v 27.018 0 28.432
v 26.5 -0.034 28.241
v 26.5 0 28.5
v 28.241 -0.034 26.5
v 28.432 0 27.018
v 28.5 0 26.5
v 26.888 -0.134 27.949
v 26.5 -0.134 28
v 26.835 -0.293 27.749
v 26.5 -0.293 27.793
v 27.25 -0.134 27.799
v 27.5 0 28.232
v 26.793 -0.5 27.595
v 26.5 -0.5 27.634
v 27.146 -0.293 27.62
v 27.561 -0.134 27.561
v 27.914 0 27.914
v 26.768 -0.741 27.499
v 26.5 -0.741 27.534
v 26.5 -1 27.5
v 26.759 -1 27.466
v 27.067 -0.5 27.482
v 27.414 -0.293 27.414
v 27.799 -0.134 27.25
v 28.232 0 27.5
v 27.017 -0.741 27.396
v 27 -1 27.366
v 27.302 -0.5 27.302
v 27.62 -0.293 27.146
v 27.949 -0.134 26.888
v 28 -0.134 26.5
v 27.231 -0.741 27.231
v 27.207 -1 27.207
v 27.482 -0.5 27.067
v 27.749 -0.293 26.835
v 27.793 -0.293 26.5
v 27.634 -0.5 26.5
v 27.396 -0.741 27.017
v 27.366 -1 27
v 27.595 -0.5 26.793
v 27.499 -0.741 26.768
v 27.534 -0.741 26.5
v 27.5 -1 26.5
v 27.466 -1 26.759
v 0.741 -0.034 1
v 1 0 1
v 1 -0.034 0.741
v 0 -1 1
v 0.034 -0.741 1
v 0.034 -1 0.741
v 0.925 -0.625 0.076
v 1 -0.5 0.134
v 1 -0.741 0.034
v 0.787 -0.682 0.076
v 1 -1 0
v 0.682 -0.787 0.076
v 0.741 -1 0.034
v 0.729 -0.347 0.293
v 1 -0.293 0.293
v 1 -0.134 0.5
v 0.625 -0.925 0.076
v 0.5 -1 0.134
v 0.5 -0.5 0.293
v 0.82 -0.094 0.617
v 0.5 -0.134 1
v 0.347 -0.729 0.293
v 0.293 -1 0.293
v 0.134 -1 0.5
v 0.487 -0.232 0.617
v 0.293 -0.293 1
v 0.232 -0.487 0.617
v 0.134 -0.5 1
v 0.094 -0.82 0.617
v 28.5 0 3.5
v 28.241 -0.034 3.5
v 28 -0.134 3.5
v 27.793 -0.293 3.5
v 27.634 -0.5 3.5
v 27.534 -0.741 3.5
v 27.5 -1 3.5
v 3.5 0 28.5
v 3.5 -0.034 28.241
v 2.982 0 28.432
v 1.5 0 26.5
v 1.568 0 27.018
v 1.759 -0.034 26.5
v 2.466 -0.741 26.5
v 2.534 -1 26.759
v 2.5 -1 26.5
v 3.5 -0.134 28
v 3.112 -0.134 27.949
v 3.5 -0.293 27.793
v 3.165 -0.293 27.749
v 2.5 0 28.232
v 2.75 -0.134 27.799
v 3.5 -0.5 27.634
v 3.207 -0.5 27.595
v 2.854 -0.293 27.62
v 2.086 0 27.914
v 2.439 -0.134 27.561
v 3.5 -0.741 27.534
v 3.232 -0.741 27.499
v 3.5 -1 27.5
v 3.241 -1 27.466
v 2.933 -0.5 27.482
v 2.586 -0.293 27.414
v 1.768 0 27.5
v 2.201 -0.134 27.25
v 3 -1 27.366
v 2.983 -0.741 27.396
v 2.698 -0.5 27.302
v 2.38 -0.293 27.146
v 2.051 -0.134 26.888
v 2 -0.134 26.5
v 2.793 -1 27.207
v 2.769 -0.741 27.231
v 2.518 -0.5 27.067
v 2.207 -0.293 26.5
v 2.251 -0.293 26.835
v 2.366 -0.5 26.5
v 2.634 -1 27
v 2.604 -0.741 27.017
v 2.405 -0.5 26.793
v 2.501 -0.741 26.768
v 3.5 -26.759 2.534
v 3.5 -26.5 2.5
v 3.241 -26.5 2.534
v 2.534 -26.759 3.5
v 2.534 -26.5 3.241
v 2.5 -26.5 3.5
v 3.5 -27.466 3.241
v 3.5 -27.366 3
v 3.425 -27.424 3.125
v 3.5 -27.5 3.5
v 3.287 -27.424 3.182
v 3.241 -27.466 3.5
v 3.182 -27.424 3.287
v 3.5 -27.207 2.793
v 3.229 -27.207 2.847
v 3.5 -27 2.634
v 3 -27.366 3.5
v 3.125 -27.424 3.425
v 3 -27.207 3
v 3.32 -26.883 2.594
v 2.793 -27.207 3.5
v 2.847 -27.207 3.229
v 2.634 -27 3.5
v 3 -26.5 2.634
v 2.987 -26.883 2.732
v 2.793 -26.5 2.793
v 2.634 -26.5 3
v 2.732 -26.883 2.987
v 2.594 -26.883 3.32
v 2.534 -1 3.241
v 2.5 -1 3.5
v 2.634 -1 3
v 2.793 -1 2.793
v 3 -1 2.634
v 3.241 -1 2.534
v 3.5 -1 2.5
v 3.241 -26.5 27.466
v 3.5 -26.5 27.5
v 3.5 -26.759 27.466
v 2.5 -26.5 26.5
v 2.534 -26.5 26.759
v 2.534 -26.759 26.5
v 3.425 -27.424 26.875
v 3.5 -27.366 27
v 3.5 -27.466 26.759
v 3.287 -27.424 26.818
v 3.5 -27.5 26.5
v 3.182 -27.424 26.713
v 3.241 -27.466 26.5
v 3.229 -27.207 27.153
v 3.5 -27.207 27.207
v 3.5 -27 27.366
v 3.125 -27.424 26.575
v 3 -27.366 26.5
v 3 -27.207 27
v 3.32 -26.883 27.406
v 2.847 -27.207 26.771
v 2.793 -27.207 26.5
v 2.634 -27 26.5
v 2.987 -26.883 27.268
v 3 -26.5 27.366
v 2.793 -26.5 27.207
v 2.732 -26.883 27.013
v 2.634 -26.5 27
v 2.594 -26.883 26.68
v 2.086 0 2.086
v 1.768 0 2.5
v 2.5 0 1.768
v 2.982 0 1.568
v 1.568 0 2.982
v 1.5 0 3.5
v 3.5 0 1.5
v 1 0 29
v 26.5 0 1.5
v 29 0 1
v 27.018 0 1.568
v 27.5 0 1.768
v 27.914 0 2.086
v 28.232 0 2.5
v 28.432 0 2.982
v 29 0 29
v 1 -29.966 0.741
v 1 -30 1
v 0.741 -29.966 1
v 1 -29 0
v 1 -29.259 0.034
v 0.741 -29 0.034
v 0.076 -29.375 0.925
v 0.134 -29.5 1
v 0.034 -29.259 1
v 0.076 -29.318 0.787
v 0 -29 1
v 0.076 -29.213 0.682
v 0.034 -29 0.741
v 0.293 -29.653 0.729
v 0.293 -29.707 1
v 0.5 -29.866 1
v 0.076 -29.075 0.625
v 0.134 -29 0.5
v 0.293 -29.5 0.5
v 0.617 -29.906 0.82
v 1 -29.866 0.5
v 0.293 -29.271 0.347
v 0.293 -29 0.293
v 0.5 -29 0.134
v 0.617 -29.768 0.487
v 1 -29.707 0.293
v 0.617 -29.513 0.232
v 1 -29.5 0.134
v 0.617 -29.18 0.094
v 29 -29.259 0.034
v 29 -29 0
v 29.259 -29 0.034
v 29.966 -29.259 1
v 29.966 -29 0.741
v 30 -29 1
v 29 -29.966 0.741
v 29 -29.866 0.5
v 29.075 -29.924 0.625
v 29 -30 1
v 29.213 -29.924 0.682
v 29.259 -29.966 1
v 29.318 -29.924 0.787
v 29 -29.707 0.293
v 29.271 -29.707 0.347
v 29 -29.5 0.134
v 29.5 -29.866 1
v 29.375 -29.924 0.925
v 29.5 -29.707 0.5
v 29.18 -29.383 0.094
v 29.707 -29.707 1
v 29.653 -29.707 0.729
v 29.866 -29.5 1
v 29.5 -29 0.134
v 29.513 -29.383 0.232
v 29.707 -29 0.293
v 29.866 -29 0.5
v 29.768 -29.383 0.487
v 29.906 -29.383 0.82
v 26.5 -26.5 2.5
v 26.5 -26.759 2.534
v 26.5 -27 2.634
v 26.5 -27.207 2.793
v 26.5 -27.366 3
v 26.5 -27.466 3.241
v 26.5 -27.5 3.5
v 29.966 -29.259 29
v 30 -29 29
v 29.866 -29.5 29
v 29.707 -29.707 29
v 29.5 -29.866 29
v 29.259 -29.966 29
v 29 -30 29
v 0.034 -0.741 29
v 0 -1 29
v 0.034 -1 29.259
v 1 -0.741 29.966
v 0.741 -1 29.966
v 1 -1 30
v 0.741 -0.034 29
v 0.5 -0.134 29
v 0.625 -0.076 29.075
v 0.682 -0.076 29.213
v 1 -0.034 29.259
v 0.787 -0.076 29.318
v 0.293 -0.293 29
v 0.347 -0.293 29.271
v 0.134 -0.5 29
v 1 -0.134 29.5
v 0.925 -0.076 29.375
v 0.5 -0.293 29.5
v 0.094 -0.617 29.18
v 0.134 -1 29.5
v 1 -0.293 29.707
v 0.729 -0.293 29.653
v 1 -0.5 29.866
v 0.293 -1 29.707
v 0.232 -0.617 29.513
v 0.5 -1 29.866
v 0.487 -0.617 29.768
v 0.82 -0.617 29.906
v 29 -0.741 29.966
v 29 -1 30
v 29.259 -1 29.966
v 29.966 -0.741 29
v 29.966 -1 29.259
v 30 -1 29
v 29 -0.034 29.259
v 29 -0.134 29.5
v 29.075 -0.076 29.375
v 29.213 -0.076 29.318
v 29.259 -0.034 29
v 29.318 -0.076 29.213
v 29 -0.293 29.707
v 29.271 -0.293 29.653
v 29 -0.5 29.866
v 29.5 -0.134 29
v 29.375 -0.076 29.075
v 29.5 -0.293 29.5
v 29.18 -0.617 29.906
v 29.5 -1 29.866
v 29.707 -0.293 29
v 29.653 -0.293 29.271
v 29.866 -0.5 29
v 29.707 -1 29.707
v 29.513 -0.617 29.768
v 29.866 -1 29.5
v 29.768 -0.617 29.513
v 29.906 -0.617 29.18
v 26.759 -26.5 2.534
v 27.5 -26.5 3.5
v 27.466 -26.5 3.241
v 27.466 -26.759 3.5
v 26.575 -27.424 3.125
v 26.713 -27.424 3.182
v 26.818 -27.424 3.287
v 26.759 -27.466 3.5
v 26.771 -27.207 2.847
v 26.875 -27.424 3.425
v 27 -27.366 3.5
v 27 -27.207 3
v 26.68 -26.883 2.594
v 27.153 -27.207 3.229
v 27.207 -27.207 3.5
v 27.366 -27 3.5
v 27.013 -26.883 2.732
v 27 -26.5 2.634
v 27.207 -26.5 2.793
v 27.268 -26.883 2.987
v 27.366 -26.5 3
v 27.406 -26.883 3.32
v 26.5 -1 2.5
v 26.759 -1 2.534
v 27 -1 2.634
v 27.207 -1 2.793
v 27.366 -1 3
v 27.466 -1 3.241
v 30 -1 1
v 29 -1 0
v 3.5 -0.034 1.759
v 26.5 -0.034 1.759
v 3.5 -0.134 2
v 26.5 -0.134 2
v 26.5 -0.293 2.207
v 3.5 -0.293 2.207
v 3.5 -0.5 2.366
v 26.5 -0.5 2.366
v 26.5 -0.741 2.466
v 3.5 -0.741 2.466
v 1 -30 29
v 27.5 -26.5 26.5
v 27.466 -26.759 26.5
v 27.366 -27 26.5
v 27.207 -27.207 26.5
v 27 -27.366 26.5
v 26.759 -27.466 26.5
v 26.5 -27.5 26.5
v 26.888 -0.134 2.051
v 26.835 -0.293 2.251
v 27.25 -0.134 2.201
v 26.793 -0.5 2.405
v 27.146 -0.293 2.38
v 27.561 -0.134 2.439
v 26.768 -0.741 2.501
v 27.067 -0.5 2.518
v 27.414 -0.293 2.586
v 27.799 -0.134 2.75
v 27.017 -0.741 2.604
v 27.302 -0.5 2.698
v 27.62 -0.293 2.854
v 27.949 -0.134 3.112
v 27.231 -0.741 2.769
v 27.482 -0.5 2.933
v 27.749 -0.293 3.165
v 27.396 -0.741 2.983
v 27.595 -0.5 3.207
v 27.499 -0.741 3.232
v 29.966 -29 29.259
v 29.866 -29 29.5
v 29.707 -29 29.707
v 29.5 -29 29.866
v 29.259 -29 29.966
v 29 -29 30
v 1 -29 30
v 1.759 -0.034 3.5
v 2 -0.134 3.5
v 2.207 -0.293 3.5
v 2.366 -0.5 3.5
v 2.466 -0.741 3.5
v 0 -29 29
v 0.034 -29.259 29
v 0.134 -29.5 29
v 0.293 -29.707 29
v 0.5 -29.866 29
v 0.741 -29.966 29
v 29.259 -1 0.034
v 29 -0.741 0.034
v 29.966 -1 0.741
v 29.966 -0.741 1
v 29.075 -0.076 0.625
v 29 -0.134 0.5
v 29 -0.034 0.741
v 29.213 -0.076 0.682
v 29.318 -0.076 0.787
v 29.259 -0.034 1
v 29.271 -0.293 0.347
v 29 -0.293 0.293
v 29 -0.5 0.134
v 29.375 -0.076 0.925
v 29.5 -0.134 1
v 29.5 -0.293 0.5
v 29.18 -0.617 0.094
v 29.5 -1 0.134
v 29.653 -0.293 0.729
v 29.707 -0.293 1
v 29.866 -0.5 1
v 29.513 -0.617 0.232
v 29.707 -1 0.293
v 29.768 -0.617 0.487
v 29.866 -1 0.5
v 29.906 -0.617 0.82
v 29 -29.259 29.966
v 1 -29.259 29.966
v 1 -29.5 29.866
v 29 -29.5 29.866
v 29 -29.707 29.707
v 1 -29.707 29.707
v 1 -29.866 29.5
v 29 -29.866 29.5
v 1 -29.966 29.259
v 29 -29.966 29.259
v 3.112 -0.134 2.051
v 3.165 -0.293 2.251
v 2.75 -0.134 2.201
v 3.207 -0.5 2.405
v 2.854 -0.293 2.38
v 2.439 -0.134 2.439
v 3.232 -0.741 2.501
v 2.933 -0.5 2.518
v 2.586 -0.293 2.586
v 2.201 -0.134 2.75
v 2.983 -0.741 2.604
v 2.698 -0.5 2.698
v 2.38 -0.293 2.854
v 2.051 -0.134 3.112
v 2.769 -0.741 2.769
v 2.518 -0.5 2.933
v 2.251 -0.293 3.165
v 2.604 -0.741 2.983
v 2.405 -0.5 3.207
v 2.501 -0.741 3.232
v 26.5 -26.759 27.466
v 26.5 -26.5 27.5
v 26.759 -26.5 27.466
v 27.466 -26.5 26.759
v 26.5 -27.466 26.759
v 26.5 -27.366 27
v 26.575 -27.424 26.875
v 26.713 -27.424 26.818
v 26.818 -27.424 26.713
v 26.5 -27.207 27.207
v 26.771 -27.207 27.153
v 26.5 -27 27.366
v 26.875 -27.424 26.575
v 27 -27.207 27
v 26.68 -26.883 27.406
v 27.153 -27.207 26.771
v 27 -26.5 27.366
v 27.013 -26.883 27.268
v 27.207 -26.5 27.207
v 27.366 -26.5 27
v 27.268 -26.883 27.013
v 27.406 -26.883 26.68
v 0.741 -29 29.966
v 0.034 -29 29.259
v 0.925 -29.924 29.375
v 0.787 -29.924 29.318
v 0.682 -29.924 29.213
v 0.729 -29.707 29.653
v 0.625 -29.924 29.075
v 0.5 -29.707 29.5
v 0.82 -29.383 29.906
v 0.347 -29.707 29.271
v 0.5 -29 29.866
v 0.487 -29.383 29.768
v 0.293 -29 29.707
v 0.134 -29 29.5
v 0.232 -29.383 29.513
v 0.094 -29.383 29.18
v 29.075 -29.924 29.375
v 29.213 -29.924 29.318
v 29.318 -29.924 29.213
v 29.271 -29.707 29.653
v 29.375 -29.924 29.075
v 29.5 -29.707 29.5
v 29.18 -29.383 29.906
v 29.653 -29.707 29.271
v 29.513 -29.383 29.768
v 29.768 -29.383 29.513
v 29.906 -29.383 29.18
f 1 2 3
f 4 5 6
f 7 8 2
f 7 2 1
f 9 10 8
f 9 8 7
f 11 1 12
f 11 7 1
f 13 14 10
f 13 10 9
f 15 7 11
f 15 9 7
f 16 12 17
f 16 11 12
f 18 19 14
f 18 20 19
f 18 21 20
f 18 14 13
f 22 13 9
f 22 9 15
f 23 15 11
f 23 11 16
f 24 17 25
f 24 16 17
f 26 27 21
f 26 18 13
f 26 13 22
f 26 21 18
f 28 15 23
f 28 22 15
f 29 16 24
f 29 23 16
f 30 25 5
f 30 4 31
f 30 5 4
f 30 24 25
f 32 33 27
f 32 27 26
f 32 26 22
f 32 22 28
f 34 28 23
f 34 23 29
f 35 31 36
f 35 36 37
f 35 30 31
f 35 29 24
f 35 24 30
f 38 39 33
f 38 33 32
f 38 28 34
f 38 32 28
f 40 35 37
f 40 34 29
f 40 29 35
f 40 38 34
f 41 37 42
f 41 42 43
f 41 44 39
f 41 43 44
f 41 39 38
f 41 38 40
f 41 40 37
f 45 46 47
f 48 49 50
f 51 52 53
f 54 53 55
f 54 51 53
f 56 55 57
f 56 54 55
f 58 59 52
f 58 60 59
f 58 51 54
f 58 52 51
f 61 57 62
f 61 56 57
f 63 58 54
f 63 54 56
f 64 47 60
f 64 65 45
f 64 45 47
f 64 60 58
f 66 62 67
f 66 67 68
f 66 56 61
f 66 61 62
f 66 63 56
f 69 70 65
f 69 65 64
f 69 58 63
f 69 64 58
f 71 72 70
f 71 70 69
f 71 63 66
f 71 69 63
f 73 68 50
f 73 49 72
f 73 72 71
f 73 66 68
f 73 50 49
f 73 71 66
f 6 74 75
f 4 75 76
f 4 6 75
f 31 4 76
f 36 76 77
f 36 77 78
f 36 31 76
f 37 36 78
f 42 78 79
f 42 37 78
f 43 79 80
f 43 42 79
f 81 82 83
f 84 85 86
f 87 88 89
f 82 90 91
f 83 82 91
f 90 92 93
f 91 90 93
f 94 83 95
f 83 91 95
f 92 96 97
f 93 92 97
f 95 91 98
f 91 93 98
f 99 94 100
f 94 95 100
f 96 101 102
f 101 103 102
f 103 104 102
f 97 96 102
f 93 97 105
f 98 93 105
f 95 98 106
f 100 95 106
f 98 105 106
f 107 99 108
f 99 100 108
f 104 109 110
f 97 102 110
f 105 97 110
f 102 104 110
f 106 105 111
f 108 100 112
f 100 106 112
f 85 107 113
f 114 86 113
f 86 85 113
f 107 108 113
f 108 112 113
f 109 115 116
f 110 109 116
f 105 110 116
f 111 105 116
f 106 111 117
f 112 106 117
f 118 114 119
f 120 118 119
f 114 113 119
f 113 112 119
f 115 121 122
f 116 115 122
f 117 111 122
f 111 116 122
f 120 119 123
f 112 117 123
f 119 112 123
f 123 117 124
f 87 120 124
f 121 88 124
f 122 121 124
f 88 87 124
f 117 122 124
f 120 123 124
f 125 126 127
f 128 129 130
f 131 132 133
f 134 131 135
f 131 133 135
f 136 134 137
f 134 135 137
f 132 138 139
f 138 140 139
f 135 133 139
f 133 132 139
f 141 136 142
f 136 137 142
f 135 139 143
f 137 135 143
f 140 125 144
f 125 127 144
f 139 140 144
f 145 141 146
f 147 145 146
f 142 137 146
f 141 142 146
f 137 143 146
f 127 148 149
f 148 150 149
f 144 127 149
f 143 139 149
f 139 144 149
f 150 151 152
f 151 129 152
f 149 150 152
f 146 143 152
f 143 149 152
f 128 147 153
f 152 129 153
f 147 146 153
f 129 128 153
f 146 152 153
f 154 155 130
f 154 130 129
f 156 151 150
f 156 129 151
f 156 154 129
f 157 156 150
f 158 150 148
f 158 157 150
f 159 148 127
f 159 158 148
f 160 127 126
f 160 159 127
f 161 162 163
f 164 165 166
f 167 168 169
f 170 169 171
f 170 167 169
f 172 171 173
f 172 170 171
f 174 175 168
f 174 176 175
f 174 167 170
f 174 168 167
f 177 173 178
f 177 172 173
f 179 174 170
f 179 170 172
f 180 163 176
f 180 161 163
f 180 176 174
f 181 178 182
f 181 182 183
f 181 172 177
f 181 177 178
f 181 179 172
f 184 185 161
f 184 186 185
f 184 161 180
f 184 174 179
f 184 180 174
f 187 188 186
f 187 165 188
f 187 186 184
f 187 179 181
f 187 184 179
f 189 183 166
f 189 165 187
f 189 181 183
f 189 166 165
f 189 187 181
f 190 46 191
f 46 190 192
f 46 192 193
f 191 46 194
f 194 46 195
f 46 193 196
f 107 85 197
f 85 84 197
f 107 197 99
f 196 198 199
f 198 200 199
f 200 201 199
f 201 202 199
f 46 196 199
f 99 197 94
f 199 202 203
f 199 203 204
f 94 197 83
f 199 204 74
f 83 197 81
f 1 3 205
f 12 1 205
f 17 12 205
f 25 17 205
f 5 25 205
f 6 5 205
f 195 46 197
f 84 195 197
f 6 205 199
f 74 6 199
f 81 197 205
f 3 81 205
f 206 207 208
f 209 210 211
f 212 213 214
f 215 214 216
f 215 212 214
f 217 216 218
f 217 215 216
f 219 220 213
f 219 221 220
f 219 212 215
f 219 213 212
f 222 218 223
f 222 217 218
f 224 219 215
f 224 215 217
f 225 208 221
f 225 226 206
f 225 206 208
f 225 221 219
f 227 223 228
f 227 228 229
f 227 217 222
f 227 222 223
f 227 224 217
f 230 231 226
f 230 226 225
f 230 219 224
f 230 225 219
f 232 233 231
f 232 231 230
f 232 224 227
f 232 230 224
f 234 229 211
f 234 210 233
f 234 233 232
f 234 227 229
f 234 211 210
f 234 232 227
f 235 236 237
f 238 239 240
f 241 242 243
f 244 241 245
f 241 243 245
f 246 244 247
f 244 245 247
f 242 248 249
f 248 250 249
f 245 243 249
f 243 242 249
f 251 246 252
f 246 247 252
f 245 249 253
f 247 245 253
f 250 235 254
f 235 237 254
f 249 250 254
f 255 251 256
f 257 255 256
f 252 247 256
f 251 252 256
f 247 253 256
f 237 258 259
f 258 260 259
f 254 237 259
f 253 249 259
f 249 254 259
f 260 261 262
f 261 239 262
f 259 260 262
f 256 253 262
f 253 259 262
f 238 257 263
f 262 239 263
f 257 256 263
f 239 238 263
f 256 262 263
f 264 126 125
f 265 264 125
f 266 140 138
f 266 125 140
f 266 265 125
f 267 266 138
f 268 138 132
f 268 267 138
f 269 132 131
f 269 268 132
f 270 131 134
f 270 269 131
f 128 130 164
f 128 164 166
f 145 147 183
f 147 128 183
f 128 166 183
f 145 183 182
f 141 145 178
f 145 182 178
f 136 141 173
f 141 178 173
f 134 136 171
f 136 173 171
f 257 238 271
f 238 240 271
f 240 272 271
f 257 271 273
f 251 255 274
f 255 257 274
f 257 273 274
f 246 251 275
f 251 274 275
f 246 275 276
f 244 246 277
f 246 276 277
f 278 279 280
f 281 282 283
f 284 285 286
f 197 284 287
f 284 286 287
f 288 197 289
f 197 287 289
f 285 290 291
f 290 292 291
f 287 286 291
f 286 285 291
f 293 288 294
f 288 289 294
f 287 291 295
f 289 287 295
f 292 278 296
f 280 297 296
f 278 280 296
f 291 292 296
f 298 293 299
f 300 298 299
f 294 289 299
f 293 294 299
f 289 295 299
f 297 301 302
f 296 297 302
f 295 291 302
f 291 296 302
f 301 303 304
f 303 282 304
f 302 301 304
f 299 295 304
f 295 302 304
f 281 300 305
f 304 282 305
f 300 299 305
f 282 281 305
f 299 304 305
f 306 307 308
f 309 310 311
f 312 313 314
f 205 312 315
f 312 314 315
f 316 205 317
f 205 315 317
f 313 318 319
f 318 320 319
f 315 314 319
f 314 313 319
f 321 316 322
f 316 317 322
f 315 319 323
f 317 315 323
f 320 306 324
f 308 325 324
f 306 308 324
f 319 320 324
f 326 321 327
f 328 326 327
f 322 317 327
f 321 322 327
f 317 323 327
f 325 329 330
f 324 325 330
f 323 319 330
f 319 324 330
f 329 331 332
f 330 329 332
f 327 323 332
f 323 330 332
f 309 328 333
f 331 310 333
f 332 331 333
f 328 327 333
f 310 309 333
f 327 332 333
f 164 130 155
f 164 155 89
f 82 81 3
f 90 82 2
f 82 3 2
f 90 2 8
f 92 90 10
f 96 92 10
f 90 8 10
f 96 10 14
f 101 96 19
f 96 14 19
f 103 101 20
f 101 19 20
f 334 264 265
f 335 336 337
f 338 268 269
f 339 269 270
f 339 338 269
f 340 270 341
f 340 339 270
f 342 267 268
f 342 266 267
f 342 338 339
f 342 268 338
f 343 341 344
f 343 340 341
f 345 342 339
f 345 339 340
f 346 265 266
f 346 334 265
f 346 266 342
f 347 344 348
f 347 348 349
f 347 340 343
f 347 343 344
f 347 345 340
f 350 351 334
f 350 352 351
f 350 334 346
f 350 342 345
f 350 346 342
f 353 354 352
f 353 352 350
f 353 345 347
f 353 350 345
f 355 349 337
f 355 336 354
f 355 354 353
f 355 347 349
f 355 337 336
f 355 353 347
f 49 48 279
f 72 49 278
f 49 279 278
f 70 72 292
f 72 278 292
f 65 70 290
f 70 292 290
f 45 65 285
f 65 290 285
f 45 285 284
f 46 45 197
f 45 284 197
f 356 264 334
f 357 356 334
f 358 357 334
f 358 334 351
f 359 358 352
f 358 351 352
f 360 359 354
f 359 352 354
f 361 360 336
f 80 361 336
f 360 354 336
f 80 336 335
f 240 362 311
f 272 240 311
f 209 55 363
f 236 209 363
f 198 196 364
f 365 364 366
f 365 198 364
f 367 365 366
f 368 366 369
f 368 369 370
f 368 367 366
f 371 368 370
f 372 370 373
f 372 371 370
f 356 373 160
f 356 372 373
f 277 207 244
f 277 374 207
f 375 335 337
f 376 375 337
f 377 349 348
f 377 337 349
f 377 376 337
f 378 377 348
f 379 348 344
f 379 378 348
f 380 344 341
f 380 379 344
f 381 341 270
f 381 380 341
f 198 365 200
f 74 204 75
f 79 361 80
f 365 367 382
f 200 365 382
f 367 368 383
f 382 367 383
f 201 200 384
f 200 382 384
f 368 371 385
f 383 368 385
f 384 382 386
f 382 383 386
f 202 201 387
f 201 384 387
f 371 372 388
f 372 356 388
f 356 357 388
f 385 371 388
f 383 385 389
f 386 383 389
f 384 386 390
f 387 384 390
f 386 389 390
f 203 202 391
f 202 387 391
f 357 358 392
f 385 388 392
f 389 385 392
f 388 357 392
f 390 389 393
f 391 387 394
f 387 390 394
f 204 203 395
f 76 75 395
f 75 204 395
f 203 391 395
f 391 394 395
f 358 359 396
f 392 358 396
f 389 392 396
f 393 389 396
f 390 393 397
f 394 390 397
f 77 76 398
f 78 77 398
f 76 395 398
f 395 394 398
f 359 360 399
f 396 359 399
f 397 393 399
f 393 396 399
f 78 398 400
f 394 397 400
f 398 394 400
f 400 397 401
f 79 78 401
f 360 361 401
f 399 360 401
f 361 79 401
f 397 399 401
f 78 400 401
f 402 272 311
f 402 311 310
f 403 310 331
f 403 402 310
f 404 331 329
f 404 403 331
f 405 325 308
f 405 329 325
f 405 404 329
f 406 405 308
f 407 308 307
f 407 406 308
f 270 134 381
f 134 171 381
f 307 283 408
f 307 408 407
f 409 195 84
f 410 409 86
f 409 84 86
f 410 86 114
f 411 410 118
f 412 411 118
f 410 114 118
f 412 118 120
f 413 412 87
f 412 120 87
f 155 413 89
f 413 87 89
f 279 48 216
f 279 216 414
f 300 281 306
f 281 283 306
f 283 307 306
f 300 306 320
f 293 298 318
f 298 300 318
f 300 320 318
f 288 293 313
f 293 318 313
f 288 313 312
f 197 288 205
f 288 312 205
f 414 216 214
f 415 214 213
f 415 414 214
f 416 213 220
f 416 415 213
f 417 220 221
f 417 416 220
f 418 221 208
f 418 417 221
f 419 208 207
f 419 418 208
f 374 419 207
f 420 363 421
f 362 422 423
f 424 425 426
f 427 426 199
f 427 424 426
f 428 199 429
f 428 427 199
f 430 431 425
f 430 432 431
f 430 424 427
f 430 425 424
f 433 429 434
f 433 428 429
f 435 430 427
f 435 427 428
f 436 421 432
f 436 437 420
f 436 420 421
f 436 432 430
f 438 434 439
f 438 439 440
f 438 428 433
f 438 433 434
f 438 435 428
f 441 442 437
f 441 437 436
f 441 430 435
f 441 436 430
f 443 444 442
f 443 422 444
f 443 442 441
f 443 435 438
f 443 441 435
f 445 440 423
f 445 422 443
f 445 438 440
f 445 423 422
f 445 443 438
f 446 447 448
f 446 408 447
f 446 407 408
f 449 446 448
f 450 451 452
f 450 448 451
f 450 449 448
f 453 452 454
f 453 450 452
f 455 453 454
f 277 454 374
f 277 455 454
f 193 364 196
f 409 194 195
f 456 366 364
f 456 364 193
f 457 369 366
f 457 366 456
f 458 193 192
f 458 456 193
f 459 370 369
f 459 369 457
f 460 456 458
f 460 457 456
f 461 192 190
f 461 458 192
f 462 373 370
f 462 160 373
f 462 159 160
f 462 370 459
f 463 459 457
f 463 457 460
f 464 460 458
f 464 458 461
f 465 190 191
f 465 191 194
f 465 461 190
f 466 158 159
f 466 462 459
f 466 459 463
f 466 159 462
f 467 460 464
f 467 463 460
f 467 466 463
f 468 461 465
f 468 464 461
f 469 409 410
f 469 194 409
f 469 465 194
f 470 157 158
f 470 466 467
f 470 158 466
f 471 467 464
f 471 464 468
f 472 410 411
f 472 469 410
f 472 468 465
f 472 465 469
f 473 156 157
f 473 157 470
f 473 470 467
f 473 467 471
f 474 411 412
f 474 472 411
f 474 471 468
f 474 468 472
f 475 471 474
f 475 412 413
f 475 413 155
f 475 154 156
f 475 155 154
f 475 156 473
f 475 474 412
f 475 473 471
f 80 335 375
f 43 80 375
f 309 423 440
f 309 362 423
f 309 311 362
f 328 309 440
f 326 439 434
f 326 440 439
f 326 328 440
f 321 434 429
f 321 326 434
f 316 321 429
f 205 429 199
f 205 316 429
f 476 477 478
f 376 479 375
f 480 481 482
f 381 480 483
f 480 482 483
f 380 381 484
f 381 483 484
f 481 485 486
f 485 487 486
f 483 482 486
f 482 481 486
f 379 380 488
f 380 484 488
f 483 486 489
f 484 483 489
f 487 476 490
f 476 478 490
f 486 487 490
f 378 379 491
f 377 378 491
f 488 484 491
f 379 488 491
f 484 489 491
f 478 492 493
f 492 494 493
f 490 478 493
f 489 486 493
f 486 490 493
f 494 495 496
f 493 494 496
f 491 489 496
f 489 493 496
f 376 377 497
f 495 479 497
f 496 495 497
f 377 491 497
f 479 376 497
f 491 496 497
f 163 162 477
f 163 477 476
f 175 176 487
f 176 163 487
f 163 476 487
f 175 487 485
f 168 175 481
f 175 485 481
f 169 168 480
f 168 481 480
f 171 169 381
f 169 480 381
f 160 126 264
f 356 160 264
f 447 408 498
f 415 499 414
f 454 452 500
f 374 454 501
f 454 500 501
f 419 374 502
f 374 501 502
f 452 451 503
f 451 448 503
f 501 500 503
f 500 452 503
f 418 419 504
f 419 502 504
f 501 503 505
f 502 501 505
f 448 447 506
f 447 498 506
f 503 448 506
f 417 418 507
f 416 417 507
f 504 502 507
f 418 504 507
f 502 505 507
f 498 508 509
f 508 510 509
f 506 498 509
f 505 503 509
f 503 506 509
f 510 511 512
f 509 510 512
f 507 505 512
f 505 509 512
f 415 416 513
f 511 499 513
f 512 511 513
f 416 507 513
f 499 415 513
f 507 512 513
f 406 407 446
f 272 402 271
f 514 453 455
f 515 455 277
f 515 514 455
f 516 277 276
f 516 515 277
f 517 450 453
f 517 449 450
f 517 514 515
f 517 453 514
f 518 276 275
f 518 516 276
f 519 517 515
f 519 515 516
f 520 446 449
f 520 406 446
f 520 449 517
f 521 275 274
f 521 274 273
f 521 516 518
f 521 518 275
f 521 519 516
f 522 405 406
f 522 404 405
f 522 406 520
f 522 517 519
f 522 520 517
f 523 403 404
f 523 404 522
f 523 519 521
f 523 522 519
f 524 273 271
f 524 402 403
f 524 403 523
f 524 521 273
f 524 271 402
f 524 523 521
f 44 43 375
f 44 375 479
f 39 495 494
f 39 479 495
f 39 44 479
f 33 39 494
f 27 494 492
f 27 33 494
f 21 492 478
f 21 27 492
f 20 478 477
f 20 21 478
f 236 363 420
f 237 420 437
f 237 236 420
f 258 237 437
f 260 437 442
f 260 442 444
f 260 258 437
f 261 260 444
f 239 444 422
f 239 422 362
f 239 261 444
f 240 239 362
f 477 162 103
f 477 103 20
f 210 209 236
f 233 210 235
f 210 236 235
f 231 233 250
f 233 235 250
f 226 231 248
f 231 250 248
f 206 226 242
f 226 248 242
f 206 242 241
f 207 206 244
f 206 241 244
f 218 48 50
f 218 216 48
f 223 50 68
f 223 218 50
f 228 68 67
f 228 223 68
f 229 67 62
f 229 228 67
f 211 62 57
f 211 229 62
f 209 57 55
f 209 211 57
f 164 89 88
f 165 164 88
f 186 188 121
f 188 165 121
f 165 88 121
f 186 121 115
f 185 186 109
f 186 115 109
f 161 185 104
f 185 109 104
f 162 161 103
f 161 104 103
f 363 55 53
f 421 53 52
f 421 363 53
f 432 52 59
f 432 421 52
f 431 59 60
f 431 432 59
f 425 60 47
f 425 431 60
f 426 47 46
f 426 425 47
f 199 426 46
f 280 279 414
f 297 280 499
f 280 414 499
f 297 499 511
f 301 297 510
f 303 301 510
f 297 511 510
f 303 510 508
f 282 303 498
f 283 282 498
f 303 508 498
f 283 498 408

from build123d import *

# Parameters (mm, degrees)
F0_W     = 30
F0_H     = 30
F1_DEPTH = 30
F2_T     = -2.5
F3_R     = 1


with BuildPart() as f1:
    # F0 (on Front) → F1 (new body)
    with BuildSketch(Plane.XZ):
        with Locations((15, 15)):
            Rectangle(F0_W, F0_H)
    extrude(amount=F1_DEPTH)

    # F2
    f2_openings = [f1.faces().sort_by_distance(p)[0] for p in [
        (15, 0, 15),
    ]]
    offset(amount=F2_T, openings=f2_openings)

    # F3
    f3_edges = [f1.edges().sort_by_distance(p)[0] for p in [
        (30, -15, 30),
        (0, -15, 30),
        (30, -15, 0),
        (2.5, -13.75, 2.5),
        (0, 0, 15),
        (15, 0, 0),
        (15, -30, 0),
        (15, 0, 30),
        (15, -30, 30),
        (0, -30, 15),
        (30, 0, 15),
        (30, -30, 15),
        (27.5, -13.75, 2.5),
        (2.5, -13.75, 27.5),
        (27.5, -13.75, 27.5),
        (15, 0, 2.5),
        (15, -27.5, 2.5),
        (15, 0, 27.5),
        (15, -27.5, 27.5),
        (2.5, 0, 15),
        (2.5, -27.5, 15),
        (27.5, 0, 15),
        (27.5, -27.5, 15),
        (0, -15, 0),
    ]]
    fillet(f3_edges, radius=F3_R)


solid = f1.part
